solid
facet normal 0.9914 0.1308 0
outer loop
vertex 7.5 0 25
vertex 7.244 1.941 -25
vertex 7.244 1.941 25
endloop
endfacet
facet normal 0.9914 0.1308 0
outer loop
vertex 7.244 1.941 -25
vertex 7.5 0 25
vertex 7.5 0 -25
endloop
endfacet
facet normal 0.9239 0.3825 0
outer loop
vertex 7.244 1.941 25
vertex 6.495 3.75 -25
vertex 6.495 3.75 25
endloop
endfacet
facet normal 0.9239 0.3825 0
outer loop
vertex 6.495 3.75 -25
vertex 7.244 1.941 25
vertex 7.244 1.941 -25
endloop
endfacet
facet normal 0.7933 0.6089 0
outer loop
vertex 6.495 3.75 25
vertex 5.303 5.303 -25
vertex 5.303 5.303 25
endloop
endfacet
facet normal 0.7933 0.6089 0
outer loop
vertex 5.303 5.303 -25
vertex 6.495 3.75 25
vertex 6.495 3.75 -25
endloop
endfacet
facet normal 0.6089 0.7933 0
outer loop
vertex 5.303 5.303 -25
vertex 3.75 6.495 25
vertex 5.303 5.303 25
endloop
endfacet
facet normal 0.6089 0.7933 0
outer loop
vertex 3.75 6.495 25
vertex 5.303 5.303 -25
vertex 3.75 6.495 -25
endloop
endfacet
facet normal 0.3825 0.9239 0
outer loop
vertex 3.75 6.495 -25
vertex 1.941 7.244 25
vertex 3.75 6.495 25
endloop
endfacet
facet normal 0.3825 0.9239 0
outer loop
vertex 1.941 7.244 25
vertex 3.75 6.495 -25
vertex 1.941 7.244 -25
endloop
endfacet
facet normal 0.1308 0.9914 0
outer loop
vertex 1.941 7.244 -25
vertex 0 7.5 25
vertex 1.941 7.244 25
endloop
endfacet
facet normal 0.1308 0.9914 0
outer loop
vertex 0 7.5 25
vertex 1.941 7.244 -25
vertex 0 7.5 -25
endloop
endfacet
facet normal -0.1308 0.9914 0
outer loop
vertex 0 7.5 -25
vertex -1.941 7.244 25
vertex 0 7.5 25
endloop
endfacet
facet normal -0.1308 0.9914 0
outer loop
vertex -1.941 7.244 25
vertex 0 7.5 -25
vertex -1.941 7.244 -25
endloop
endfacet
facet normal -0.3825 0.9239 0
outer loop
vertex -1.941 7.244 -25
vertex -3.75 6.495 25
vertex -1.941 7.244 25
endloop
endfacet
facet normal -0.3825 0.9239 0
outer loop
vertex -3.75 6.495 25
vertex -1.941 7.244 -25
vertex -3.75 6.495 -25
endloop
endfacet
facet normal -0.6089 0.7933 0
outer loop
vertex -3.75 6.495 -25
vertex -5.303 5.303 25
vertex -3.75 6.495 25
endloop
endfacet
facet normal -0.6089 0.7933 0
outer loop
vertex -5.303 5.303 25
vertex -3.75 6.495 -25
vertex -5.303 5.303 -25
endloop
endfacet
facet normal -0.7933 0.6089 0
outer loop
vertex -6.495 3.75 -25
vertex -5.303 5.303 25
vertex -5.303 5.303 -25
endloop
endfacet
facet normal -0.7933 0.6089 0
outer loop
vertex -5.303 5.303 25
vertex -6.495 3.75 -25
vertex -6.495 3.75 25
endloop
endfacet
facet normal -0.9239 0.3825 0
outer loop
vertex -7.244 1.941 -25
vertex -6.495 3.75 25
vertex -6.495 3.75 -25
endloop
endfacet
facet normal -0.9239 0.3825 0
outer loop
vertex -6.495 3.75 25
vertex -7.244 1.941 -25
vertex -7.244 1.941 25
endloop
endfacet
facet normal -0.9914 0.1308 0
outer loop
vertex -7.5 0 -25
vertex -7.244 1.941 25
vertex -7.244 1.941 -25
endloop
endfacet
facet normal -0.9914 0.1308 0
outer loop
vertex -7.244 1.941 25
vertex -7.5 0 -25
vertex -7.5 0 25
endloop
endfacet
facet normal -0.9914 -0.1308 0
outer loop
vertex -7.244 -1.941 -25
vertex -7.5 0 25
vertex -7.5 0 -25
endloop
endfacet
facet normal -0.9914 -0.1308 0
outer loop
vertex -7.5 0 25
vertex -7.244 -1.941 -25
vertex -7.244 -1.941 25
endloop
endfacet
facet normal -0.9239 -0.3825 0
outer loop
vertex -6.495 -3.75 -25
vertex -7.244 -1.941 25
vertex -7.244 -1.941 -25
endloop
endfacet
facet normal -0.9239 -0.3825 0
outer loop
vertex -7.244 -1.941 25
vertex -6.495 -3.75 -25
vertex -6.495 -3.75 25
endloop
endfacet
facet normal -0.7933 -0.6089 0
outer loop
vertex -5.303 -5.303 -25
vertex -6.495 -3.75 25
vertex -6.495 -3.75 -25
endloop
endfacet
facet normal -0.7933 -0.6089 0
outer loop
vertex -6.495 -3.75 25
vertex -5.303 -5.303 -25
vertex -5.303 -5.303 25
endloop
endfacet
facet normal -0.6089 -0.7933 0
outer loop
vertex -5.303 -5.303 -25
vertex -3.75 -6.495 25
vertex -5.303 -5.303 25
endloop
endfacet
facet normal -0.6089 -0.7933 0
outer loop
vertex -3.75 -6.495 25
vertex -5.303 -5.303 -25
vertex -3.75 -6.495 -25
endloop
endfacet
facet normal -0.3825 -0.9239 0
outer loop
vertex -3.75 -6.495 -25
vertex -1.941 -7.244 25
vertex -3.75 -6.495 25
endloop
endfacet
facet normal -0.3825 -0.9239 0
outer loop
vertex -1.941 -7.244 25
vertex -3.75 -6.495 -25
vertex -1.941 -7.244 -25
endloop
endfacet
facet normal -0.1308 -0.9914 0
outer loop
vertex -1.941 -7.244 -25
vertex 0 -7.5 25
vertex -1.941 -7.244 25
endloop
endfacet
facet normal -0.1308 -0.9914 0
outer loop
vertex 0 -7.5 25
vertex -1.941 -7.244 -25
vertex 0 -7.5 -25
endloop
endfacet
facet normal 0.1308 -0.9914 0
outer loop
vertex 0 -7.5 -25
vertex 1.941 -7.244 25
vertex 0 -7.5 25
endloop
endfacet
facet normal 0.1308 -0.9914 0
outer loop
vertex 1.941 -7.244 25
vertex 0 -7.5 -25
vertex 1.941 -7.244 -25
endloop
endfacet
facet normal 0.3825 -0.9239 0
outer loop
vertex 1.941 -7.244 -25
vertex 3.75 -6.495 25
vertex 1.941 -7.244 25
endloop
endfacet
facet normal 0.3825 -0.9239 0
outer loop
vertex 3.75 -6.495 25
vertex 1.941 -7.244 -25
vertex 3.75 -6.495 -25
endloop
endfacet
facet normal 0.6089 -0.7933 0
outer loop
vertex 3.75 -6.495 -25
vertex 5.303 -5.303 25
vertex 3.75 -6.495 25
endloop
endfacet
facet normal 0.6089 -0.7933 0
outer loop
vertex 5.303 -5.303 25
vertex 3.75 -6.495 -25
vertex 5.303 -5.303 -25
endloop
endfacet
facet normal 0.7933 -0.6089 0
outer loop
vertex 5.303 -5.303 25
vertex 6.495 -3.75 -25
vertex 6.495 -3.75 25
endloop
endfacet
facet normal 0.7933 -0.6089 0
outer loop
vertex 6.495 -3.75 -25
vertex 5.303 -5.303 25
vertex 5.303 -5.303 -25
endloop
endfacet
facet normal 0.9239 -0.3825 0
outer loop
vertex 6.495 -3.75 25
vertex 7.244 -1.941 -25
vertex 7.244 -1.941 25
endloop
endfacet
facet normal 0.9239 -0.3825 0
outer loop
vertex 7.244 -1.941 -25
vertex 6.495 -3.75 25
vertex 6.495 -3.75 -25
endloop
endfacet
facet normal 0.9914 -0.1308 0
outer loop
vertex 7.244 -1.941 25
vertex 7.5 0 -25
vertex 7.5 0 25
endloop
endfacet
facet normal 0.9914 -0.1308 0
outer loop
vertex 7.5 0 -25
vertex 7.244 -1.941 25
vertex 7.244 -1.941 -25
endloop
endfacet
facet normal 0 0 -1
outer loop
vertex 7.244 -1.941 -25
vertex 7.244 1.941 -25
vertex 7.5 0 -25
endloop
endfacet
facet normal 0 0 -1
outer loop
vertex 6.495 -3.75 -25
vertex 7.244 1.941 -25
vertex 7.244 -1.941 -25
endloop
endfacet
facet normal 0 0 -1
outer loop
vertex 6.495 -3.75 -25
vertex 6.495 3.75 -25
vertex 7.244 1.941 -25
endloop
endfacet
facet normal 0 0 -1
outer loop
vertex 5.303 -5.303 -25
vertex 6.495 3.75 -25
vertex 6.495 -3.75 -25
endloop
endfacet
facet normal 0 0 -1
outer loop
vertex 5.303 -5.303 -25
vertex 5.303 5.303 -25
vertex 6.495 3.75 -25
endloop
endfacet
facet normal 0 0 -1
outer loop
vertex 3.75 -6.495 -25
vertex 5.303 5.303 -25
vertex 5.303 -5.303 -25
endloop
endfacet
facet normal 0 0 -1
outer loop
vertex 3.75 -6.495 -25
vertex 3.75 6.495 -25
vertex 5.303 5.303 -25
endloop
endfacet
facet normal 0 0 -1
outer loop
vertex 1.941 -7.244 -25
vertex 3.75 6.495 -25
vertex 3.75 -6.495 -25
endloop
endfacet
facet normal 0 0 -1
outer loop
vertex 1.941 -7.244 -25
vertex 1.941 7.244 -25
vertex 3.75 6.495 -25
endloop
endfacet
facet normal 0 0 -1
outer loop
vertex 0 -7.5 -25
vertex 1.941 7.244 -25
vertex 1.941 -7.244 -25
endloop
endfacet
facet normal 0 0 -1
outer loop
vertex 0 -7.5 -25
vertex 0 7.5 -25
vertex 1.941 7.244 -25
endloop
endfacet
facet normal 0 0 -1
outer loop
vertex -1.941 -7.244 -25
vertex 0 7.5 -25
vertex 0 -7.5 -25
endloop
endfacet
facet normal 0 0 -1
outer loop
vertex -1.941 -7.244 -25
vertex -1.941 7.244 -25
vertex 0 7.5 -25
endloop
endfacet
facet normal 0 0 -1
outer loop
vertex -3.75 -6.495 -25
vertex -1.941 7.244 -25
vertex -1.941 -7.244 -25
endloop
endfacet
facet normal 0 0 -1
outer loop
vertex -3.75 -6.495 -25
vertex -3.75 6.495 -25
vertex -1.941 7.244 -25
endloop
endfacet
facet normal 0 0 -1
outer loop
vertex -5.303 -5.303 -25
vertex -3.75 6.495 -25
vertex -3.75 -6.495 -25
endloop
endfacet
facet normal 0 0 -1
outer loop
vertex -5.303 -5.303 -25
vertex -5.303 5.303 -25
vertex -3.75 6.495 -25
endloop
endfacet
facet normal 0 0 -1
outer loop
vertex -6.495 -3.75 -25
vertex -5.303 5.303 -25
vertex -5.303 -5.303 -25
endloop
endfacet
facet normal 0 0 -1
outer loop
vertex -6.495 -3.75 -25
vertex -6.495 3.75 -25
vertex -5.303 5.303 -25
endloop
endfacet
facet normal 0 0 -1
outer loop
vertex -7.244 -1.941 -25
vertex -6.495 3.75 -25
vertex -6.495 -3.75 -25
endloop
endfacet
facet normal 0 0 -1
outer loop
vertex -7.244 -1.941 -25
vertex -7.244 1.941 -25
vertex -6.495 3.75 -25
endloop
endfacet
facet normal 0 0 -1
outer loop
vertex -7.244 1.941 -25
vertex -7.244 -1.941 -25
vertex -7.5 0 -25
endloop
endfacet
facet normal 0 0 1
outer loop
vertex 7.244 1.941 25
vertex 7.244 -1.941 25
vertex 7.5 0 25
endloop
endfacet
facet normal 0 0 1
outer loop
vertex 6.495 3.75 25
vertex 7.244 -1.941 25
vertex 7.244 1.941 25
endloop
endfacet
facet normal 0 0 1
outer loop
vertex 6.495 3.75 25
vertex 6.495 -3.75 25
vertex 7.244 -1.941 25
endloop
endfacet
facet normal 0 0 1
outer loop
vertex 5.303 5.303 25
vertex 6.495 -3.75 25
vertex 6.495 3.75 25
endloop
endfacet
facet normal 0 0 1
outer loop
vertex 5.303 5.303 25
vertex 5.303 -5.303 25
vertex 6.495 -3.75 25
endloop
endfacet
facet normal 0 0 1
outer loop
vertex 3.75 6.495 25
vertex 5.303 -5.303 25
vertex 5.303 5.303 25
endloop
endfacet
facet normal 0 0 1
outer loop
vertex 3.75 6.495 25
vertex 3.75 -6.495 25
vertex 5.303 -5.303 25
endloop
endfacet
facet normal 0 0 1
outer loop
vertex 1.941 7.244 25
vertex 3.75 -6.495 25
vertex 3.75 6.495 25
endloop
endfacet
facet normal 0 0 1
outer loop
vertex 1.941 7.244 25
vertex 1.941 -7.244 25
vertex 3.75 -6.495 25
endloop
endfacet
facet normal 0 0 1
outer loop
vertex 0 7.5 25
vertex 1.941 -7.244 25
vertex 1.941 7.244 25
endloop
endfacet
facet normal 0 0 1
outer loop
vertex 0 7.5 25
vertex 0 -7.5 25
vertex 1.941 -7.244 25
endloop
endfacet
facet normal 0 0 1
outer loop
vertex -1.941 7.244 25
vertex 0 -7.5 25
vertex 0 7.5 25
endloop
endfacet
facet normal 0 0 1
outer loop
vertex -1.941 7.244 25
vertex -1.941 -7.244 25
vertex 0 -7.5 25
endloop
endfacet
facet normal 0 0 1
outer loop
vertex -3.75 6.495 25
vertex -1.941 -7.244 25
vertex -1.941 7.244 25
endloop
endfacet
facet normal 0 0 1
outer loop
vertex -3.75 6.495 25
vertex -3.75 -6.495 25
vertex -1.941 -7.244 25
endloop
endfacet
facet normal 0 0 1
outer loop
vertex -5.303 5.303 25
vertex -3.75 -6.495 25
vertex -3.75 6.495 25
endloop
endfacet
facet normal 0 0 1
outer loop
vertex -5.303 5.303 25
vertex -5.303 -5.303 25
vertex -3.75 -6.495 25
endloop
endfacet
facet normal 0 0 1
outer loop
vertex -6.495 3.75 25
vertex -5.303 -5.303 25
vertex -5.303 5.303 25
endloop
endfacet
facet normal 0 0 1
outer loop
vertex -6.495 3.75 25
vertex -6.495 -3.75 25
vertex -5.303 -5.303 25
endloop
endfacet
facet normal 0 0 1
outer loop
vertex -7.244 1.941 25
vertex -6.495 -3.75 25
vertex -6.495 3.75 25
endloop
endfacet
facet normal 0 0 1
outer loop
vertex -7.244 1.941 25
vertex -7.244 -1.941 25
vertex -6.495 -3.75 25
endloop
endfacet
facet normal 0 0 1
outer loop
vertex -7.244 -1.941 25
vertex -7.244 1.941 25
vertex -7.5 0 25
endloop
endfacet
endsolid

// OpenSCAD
// Generated by SolidPython 0.4.6 on 2020-01-18 00:39:44


cylinder(center = true, d = 15, h = 50);
/***********************************************
*********      SolidPython code:      **********
************************************************
 
# Generic Part Class

# Import SolidPython
from solid import *

# This class acts more as a specification and generator for the geometry than as a representation of the actual objects.
# Each part needs to be self-contained and run without information from the other parts (directly)
# This will allow more flexibility in design as we can change each part individually without affecting the others
class RSGL_Part:
    
    # Needs to be overrided by other classes to be used
    # Create a new instance of this object and return it to the user
    def generate_geometry(self):
        print('Generating Part Geometry')
        return None
    
    def render_to_file(self, path):
        
        if not path.endswith('.scad'):
            raise ValueError('File is not an OpenSCAD file')
            return None
        
        g = self.generate_geometry()
        print('Rendering to %s' % path)
        
        try:
            scad_render_to_file(g, path)
        except Exception as e:
            print(e)
            return None
        
        return g
    
    def render_to_stl(self, path):
        self.render_to_file(path + 'scad')
        raise NotImplementedError('Rendering to STL file has not been implemented yet.')
        print('Rendering to %s' % path)
 
 
************************************************/
